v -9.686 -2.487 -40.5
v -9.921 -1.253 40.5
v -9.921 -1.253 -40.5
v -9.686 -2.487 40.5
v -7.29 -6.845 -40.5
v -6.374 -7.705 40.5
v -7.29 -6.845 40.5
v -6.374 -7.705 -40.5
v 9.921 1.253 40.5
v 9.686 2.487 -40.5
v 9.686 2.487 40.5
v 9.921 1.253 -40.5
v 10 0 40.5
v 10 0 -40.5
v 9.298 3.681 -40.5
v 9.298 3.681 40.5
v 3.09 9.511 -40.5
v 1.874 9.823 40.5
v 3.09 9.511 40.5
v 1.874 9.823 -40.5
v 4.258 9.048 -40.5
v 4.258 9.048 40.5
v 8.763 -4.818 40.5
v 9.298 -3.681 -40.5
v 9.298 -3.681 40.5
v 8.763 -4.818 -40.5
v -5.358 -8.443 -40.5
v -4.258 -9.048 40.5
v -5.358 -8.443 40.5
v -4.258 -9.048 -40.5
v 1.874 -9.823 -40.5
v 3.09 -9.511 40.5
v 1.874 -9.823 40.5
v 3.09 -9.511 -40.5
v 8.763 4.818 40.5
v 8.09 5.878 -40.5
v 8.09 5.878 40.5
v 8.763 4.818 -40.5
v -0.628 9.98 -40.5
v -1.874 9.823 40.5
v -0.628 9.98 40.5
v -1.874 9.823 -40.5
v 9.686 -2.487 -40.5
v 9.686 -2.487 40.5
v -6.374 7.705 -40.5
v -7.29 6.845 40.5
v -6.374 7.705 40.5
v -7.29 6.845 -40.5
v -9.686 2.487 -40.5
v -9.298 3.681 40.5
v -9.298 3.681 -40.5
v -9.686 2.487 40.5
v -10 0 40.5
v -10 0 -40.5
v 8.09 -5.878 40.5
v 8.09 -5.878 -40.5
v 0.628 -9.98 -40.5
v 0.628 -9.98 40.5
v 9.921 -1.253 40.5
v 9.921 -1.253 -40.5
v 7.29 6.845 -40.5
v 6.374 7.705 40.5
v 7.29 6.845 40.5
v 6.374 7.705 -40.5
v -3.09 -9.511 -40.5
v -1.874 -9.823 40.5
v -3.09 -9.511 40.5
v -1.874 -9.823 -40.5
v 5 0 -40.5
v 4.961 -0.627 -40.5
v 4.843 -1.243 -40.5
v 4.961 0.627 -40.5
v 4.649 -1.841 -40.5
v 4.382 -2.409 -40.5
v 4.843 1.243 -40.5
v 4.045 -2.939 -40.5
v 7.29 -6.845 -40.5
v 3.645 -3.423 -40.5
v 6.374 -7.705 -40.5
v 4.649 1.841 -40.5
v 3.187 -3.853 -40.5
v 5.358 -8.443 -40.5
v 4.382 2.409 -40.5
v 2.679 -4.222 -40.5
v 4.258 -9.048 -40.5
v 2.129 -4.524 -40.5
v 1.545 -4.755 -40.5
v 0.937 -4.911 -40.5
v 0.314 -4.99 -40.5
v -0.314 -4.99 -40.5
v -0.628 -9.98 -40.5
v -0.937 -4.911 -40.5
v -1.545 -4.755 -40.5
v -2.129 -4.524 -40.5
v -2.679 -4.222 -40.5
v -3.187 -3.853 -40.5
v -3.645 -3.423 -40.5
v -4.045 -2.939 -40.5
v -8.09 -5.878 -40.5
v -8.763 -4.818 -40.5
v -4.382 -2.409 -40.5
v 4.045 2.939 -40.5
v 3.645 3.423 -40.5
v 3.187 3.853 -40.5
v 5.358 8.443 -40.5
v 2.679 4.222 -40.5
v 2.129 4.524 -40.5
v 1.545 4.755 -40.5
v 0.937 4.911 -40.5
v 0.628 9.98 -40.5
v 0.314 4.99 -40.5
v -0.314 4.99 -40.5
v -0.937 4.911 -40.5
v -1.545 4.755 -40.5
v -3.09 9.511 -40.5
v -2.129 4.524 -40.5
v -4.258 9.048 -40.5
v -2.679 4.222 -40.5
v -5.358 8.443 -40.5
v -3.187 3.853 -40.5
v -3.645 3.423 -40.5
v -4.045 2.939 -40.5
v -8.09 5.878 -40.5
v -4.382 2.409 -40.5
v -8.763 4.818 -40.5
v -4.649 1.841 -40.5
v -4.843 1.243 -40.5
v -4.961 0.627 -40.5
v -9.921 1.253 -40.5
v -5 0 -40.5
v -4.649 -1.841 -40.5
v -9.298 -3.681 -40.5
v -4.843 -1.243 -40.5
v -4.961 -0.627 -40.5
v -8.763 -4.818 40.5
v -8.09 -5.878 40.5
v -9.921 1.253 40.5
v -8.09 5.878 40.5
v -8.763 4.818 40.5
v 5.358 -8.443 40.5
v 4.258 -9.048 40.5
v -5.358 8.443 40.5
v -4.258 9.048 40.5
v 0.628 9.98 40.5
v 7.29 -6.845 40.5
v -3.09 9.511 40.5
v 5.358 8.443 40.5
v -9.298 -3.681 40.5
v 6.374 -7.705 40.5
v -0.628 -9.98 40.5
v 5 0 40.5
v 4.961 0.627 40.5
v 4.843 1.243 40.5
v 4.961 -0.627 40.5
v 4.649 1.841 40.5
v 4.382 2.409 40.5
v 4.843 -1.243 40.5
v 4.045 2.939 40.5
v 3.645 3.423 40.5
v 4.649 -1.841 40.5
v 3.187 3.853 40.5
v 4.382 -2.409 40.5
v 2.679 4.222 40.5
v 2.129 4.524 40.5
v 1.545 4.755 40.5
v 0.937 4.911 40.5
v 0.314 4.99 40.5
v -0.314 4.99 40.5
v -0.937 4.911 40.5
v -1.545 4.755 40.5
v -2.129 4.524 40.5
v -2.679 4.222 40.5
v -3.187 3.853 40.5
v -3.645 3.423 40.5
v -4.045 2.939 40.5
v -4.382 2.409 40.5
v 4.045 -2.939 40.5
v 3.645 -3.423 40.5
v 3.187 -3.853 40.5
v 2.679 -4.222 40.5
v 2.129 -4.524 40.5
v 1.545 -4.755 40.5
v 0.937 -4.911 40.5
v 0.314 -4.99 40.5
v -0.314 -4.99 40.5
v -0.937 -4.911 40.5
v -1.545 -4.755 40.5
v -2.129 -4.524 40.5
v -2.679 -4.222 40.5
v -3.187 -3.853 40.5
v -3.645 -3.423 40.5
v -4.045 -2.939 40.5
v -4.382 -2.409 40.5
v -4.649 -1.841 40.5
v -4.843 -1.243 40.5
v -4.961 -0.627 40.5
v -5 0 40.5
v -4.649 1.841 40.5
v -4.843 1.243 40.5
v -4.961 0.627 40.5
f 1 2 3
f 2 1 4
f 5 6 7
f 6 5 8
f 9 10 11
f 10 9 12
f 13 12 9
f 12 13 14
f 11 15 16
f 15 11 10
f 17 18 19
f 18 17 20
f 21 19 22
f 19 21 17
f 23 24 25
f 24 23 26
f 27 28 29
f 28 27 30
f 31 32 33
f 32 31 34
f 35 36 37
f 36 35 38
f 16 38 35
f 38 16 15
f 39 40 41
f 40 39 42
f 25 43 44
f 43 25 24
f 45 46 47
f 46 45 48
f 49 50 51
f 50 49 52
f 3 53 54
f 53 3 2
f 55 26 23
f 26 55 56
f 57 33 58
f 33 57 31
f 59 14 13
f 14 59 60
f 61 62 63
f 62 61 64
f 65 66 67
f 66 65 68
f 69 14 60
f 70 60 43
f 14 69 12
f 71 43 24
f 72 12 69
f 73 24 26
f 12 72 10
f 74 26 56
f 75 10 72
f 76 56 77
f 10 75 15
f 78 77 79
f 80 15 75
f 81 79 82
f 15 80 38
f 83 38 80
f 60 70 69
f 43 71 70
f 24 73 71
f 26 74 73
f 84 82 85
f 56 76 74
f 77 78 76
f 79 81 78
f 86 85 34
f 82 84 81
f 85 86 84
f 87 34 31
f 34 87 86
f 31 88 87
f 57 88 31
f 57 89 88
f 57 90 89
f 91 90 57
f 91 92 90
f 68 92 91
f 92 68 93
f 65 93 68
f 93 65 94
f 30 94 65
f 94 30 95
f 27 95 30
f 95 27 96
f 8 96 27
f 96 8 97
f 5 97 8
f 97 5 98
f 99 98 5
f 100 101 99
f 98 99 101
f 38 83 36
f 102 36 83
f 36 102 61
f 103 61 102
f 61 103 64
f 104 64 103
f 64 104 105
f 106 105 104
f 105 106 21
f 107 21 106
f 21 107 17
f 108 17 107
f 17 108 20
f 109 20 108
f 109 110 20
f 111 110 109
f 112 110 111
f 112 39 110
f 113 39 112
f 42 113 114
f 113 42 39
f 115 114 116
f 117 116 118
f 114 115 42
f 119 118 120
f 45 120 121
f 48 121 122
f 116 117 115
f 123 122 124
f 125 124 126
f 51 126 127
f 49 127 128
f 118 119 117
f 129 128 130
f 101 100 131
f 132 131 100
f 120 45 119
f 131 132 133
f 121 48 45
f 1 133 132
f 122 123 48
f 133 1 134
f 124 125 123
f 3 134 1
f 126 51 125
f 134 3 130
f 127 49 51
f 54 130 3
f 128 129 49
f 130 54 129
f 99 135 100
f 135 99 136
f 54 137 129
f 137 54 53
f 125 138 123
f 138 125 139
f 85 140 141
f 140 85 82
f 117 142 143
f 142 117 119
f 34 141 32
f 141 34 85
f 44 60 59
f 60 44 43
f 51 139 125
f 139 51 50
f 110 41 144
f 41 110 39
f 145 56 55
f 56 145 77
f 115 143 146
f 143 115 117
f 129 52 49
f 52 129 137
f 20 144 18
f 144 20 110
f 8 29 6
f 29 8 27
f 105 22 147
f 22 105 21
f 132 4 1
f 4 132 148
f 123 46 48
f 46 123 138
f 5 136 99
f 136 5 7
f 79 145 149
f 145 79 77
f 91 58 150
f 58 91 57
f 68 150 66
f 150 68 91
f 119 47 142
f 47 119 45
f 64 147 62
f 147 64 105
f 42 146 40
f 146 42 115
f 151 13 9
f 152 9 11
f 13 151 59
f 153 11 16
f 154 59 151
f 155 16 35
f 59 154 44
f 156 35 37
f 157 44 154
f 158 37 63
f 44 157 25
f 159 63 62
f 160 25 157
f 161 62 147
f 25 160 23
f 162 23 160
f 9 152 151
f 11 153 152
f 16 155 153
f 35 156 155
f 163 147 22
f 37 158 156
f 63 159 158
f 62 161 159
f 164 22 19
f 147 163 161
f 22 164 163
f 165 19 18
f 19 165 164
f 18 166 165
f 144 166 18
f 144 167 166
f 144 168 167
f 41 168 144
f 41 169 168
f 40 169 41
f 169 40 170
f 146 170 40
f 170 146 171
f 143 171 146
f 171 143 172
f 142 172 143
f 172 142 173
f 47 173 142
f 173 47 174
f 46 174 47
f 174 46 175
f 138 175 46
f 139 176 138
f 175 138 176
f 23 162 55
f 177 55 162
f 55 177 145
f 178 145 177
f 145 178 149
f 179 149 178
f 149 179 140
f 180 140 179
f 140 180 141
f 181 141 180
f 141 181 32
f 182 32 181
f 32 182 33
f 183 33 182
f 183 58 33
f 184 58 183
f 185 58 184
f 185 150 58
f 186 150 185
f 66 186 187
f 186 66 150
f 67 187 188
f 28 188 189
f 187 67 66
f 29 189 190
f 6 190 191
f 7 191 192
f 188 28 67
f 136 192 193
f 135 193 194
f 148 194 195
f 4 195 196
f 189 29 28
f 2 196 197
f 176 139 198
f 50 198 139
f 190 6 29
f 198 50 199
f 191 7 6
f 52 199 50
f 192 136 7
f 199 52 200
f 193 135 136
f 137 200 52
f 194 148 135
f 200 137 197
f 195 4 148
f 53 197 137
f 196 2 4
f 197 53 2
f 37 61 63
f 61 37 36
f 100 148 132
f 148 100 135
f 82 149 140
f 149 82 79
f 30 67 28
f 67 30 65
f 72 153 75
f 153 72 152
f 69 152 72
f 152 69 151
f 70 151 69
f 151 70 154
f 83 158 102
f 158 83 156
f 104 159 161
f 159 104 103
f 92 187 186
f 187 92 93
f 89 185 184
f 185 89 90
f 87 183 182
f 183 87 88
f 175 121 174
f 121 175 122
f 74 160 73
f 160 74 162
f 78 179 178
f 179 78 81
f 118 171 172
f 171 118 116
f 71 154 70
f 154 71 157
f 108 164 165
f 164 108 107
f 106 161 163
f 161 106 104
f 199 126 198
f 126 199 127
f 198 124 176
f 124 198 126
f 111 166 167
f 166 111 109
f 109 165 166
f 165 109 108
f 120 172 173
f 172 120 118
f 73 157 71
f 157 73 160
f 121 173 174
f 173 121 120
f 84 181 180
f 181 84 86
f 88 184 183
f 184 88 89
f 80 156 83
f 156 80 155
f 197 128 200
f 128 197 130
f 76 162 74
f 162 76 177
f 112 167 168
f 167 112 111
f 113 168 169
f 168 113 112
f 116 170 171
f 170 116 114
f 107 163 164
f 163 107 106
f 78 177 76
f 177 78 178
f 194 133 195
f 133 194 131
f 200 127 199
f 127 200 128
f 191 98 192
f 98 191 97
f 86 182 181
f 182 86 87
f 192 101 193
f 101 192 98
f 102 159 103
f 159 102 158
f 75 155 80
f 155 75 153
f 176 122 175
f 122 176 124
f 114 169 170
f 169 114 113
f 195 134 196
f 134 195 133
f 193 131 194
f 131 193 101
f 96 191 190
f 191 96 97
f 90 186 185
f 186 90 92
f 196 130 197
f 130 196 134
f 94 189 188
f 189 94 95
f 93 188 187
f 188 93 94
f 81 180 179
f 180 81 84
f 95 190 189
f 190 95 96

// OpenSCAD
$fn = 50;


difference() {
	union() {
		translate(v = [0, 0, -40.5000000000]) {
			cylinder(h = 81, r = 10.0000000000);
		}
	}
	union() {
		translate(v = [0, 0, -100.0000000000]) {
			cylinder(h = 200, r = 5.0000000000);
		}
	}
}
